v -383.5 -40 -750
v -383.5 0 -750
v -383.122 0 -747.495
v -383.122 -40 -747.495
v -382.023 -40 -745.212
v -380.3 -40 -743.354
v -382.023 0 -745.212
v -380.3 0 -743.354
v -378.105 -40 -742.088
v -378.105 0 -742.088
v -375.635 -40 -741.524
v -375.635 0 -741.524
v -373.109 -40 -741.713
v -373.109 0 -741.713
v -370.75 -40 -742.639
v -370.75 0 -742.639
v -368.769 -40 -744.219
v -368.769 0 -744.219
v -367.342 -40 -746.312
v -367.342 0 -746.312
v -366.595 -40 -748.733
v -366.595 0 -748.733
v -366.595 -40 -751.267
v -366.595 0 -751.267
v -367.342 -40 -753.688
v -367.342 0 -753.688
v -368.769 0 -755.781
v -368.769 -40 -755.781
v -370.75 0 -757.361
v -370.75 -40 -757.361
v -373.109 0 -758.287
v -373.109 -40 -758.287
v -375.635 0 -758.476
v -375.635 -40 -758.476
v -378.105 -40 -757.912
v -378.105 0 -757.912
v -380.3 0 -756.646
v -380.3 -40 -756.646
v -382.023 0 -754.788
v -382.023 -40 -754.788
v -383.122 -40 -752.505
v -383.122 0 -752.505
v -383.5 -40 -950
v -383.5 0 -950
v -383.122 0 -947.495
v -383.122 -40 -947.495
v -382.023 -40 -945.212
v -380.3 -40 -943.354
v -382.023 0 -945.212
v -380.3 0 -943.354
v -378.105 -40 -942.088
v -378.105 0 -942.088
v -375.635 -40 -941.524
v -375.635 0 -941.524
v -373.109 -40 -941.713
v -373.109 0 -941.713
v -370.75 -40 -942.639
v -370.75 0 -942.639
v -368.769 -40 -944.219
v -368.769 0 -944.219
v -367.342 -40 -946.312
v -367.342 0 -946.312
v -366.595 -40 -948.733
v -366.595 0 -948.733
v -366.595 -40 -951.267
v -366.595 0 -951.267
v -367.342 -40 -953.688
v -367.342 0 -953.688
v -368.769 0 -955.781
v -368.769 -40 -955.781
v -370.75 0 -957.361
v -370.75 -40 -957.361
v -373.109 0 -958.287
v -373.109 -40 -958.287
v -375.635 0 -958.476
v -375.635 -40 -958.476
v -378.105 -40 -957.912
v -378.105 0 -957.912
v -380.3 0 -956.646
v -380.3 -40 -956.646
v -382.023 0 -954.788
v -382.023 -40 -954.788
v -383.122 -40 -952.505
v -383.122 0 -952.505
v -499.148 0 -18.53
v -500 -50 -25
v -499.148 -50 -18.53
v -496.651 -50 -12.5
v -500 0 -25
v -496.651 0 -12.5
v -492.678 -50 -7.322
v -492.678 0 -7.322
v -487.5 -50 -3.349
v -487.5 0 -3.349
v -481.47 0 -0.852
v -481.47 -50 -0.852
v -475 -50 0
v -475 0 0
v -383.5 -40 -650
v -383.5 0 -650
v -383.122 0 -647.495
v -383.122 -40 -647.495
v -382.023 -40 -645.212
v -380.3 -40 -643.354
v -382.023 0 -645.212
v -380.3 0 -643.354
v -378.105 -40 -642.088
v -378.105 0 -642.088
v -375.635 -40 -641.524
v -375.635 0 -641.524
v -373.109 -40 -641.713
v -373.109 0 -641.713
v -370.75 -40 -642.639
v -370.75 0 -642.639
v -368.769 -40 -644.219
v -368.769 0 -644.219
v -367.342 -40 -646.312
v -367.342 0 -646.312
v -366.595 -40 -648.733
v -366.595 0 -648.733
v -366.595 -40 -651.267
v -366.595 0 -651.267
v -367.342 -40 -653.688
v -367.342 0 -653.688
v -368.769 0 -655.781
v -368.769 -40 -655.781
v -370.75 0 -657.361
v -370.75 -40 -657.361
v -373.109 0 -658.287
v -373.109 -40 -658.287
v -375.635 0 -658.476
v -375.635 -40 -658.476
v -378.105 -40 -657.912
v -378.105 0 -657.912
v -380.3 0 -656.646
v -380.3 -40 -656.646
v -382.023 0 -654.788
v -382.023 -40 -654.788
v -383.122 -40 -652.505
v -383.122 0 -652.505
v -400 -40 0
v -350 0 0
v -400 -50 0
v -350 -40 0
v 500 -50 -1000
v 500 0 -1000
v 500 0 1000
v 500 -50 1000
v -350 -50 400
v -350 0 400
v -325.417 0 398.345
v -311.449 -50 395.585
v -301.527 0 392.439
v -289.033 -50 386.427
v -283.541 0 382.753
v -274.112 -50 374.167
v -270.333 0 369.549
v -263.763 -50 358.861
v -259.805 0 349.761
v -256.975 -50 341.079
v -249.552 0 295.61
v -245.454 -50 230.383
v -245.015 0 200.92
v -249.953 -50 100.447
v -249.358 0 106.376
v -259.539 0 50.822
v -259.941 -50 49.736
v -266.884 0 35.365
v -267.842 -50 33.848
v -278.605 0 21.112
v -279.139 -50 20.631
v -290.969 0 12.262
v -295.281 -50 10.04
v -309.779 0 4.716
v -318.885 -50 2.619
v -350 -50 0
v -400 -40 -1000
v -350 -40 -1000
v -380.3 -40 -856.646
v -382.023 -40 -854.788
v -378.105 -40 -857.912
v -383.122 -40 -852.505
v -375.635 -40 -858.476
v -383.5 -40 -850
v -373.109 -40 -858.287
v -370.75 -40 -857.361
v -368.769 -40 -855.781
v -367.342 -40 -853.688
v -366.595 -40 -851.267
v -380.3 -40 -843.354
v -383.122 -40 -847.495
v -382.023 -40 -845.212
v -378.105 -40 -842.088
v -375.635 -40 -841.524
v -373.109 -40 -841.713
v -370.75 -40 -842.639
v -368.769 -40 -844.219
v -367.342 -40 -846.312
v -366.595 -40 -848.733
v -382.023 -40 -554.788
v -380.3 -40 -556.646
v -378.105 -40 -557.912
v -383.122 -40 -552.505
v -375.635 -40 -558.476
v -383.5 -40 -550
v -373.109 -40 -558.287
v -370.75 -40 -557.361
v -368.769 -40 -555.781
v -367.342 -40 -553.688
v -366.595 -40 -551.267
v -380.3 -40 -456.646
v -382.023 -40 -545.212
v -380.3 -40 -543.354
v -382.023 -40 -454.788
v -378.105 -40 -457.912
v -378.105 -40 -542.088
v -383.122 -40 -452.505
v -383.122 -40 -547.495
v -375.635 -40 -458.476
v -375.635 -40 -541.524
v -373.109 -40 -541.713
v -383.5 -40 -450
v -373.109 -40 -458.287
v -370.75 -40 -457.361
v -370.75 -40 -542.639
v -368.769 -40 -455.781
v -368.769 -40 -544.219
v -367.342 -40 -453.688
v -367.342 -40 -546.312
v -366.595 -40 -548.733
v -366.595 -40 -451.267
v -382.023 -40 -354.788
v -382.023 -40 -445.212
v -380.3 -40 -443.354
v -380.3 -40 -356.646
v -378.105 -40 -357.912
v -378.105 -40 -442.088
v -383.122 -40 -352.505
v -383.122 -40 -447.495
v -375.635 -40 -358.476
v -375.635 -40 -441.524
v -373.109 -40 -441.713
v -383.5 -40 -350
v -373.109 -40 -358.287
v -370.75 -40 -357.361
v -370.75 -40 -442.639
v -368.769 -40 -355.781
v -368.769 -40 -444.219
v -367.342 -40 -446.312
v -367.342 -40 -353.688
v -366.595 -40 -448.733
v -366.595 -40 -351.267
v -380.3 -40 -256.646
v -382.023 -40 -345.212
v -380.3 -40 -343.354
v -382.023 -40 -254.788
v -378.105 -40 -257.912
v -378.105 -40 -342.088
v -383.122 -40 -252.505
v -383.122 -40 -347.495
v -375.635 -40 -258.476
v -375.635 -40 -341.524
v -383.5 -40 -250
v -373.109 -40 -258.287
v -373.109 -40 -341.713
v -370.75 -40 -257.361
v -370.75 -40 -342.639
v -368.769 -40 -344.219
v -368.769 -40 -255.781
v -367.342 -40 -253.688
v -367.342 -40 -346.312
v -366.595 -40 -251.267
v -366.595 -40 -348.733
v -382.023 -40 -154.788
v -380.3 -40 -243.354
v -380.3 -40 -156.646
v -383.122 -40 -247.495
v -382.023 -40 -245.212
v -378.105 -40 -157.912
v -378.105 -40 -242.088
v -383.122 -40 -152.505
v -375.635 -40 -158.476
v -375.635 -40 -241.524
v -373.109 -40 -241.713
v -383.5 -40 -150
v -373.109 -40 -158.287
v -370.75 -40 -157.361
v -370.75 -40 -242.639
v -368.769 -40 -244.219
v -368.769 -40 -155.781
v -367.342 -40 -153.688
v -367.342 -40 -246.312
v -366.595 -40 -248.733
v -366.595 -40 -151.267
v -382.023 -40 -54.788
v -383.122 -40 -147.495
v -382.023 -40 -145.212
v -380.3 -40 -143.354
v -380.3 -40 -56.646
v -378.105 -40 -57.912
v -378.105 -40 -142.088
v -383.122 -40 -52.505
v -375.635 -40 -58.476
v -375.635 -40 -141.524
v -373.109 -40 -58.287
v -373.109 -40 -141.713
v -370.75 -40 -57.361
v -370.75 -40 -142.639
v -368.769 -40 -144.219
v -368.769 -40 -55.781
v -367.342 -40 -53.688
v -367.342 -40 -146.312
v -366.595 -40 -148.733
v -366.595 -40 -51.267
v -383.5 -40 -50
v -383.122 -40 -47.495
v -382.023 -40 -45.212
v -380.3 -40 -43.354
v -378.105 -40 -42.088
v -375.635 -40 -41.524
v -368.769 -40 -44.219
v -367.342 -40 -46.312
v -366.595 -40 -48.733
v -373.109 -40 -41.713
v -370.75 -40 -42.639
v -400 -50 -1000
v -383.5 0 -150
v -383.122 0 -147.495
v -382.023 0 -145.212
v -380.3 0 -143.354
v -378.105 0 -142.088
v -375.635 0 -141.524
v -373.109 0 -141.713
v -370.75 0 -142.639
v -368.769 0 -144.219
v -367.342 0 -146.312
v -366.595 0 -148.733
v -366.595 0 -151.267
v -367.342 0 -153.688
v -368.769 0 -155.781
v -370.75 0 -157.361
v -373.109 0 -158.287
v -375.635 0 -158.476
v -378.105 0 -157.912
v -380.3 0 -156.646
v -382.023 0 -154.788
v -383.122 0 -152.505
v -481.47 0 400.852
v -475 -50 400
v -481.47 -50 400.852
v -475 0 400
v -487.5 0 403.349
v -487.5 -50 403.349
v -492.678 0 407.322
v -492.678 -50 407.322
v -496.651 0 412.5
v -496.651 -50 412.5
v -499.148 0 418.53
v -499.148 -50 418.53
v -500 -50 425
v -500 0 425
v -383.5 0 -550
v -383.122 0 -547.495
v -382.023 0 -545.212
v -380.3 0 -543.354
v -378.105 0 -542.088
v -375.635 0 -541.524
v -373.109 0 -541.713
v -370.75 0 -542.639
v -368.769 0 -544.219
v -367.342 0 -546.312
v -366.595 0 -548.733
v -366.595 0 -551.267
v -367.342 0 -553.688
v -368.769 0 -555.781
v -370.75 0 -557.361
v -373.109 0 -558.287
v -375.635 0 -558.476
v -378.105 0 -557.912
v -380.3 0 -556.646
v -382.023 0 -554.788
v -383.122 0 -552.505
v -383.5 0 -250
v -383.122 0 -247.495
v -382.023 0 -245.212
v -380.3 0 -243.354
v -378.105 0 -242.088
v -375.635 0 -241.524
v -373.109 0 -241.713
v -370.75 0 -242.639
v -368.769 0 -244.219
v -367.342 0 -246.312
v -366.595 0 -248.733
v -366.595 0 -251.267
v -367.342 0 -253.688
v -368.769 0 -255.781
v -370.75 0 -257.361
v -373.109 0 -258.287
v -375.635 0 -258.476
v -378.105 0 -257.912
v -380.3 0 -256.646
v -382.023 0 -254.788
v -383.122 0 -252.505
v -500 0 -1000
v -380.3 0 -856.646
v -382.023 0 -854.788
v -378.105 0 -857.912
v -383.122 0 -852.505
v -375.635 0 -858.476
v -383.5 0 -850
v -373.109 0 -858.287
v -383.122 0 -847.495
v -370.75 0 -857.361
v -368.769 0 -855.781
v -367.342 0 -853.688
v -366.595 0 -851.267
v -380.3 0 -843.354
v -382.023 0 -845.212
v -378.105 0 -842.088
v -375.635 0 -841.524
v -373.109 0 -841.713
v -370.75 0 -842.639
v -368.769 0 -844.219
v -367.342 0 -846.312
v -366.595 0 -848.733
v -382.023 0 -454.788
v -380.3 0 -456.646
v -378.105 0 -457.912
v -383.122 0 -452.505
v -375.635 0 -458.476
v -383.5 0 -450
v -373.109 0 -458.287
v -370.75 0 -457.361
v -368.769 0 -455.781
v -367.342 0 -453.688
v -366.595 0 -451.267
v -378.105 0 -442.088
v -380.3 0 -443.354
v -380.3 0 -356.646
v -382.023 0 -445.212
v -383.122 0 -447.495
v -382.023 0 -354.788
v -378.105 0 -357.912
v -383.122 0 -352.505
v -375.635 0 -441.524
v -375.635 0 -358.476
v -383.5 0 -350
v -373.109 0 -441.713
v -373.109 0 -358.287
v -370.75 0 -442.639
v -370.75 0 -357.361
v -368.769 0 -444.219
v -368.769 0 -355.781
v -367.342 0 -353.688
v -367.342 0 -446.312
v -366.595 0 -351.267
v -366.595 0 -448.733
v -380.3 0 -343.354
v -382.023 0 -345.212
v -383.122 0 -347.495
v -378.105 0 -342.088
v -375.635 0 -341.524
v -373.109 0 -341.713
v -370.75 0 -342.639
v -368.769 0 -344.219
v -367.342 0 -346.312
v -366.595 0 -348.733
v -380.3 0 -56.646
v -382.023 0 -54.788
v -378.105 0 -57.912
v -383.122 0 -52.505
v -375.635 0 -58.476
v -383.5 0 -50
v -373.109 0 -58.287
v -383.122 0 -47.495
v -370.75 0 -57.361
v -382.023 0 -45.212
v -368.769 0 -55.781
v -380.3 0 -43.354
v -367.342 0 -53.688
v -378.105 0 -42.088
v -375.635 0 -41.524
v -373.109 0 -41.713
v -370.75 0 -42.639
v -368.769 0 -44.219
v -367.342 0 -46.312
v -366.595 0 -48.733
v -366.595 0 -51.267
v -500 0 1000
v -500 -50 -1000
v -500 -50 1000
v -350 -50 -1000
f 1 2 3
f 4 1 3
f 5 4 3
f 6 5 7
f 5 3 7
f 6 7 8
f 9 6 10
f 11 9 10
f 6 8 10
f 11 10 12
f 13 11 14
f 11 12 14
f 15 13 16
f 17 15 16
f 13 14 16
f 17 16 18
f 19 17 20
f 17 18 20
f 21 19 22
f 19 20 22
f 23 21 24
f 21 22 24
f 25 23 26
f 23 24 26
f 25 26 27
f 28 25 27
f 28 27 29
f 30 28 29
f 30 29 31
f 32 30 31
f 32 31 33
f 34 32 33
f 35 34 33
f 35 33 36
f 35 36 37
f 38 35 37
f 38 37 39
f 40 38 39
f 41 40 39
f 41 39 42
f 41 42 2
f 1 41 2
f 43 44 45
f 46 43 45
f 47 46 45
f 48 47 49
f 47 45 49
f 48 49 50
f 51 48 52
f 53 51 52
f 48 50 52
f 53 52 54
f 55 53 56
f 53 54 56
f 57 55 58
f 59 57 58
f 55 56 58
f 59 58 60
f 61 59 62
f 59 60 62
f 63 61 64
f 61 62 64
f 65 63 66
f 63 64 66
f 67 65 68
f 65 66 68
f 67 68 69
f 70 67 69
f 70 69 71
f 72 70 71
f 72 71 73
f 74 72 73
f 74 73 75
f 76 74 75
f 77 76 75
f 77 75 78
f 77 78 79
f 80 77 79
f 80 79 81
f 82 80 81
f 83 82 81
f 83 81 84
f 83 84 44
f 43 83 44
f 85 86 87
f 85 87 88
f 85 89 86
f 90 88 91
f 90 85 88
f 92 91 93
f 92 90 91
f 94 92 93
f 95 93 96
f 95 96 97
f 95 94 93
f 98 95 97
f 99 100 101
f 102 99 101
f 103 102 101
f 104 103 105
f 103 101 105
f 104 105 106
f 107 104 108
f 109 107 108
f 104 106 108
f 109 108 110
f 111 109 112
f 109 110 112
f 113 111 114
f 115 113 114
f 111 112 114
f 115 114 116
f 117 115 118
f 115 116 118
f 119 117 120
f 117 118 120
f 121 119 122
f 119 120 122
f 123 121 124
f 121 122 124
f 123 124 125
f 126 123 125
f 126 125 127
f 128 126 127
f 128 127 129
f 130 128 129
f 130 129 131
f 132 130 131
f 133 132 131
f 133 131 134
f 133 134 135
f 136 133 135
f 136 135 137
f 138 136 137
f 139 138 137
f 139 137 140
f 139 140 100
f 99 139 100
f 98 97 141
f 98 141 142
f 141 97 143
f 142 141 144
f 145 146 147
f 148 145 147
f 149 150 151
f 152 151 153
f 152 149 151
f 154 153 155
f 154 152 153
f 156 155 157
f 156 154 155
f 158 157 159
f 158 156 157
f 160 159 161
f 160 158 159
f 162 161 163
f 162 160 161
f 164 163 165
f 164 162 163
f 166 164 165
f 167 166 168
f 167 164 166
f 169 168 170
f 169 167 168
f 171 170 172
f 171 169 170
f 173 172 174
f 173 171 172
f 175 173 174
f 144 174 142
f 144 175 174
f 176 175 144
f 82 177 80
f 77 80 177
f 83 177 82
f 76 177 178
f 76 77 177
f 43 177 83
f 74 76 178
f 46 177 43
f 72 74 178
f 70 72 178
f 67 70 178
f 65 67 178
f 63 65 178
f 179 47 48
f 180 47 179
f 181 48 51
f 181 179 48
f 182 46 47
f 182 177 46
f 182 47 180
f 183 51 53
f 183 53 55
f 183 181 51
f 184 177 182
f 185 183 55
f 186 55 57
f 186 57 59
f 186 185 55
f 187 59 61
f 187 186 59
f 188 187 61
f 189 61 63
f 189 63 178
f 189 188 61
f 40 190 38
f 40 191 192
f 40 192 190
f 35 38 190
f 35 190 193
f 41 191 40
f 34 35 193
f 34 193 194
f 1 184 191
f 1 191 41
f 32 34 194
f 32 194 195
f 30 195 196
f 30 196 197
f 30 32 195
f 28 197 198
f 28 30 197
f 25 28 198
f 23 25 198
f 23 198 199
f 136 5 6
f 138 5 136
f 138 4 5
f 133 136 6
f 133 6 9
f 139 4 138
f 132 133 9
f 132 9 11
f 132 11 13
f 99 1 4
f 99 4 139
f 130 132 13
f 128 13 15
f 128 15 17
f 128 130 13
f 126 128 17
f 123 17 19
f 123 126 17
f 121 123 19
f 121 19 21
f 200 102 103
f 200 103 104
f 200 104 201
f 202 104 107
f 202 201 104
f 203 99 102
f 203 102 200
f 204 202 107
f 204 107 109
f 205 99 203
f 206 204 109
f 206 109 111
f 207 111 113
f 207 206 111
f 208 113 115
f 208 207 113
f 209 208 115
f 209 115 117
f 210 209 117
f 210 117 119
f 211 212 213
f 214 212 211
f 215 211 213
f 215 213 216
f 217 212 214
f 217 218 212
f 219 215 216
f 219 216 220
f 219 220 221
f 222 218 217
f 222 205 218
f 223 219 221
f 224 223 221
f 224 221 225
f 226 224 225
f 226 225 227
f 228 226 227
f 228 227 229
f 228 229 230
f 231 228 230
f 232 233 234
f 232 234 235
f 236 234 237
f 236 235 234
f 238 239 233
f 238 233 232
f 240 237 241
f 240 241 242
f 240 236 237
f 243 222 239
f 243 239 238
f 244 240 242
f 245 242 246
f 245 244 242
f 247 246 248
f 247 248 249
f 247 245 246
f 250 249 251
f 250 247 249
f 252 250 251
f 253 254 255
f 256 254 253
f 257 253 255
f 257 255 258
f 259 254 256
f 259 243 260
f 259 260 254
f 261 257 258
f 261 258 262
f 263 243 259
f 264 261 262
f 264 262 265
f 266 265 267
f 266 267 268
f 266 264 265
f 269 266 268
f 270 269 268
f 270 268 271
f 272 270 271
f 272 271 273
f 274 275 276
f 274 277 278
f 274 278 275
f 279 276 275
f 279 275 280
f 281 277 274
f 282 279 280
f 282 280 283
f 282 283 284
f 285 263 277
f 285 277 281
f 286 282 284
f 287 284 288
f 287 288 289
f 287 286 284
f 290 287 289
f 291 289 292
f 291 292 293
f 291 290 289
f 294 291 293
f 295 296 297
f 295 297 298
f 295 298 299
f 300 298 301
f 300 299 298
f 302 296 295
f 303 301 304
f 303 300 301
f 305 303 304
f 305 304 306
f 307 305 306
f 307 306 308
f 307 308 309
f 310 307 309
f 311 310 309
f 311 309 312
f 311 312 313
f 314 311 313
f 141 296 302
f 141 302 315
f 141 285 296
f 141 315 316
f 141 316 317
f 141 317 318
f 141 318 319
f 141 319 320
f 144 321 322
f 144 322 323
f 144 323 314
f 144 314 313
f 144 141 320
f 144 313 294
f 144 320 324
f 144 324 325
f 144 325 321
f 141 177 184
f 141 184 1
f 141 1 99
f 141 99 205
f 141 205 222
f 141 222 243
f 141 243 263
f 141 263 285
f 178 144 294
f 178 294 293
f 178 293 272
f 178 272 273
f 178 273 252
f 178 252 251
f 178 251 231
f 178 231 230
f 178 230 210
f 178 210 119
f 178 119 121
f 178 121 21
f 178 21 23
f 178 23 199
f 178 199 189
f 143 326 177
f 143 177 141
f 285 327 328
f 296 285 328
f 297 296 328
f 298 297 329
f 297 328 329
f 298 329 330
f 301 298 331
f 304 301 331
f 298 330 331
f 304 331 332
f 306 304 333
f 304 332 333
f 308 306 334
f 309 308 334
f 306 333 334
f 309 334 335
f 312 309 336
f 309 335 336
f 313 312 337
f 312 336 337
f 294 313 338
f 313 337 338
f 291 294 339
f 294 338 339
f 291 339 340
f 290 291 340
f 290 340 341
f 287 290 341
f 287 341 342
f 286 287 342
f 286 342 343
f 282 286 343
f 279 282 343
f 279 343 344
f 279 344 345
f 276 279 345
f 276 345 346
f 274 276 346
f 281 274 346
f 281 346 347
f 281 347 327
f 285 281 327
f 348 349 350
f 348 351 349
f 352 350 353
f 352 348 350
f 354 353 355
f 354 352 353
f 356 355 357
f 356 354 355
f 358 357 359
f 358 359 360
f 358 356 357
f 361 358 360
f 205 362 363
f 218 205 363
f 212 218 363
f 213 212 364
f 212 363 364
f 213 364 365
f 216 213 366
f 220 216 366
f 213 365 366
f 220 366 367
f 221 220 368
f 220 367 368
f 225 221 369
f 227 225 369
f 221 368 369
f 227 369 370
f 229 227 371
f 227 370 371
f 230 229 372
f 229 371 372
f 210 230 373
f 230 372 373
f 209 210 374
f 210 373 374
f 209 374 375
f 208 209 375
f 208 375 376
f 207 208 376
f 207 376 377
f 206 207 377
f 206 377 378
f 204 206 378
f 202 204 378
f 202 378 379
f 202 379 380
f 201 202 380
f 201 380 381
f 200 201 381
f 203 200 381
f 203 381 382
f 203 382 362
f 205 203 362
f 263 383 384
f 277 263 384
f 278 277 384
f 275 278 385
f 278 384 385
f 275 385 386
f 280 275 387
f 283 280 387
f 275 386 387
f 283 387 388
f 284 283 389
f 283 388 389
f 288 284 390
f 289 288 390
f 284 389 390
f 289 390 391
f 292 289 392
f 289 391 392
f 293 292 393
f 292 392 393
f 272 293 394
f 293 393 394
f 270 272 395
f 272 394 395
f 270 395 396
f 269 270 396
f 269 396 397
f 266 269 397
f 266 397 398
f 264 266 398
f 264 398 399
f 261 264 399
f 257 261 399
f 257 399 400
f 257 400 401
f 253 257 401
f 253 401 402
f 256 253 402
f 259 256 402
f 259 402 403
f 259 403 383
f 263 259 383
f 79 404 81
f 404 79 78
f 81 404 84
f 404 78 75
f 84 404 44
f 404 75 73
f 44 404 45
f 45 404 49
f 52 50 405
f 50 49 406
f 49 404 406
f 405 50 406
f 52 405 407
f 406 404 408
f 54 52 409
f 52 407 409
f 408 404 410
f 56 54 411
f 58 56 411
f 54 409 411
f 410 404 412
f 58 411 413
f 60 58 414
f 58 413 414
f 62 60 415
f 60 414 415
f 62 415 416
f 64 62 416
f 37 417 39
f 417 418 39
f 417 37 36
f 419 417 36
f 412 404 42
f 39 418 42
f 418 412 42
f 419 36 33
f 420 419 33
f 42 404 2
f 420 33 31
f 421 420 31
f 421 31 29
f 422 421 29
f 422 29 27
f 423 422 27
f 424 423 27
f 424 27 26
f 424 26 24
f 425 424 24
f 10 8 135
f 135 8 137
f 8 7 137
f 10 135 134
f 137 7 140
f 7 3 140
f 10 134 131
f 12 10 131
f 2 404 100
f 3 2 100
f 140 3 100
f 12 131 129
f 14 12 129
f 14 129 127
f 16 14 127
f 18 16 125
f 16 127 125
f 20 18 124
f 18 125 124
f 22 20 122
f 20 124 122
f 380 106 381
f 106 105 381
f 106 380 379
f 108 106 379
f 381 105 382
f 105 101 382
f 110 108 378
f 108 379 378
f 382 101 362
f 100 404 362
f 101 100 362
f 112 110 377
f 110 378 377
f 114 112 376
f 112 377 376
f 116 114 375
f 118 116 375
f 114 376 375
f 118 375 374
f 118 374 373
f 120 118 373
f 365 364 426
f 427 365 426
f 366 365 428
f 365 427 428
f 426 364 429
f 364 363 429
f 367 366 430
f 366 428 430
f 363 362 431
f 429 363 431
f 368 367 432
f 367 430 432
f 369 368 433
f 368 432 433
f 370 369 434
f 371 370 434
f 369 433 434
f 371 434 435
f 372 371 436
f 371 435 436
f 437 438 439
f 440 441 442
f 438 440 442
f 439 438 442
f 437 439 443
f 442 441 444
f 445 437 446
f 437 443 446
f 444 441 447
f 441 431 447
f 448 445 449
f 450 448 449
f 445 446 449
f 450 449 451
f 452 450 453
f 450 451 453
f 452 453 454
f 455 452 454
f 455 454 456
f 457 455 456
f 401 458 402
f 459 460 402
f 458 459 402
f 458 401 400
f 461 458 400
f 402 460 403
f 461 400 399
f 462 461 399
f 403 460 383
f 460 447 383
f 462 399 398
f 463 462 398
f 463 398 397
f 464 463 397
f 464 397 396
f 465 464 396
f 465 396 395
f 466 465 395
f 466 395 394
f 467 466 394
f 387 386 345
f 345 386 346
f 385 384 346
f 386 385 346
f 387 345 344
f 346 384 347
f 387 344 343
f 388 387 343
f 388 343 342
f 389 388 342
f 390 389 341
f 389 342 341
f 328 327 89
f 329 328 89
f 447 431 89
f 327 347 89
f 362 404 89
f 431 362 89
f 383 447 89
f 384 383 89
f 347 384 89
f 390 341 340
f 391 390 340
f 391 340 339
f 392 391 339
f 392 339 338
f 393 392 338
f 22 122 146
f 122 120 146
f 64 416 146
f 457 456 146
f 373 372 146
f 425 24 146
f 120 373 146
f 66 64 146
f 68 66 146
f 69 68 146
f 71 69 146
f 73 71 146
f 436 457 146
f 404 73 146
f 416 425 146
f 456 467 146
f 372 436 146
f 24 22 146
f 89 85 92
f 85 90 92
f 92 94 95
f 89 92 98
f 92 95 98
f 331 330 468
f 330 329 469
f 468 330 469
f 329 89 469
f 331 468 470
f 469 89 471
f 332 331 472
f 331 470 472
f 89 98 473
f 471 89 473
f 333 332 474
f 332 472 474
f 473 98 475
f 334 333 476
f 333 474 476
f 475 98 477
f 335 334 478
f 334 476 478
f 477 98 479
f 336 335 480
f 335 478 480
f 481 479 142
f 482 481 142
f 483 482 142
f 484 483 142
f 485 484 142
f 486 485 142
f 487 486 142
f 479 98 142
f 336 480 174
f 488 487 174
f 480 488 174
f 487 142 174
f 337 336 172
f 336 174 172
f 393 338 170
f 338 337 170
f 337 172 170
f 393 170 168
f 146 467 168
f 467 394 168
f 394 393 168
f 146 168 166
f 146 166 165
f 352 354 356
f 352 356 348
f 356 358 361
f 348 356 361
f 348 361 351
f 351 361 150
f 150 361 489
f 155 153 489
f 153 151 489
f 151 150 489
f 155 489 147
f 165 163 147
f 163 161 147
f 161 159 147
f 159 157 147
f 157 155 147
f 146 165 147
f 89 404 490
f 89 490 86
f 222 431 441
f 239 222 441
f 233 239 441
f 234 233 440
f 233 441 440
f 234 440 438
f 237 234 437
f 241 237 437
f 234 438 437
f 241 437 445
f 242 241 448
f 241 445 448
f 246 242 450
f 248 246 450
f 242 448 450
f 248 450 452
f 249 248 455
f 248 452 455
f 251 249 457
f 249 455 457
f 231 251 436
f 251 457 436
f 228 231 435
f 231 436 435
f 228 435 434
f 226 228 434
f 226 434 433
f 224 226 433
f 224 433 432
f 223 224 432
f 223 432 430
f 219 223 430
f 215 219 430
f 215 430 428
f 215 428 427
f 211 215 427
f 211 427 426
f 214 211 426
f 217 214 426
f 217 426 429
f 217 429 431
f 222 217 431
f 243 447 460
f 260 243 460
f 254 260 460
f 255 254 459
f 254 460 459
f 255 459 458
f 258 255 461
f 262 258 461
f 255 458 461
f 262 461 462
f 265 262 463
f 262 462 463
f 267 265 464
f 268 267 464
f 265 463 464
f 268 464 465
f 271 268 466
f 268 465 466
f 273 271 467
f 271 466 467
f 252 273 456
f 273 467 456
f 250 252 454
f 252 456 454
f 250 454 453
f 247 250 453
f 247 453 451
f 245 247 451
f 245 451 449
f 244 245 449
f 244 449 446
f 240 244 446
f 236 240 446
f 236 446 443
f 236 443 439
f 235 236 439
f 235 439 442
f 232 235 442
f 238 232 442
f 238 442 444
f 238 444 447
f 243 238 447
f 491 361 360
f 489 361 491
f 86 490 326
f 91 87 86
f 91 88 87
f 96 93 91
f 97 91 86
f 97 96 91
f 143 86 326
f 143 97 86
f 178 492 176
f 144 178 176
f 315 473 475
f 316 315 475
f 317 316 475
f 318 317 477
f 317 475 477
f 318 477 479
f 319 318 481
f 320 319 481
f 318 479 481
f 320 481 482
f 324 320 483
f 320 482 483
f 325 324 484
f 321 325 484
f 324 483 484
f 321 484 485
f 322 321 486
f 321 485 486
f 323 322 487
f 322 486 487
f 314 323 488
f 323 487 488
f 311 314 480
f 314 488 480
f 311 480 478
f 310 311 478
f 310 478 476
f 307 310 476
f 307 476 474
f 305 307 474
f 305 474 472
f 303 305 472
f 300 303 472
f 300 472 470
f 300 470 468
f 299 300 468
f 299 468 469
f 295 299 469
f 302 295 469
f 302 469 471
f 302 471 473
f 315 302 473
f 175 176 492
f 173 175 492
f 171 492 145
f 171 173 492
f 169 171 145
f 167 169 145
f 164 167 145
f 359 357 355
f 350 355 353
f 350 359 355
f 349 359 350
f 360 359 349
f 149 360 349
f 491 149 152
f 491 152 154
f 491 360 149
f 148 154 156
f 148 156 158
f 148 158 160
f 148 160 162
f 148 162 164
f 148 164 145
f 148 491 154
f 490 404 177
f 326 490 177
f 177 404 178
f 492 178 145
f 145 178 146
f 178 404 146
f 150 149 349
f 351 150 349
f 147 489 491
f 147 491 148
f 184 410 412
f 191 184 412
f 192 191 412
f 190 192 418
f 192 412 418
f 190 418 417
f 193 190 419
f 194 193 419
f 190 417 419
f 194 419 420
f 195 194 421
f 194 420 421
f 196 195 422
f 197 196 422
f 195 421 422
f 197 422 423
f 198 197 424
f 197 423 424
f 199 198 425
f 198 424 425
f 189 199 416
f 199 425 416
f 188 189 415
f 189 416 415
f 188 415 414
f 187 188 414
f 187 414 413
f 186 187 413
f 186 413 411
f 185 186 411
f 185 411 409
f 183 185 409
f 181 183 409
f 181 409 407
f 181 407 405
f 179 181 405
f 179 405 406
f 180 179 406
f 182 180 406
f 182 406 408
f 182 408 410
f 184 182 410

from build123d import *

# Parameters (mm, degrees)
F0_W     = 1000
F0_H     = 2000
F1_DEPTH = 50
F2_W     = 50
F2_H     = 1000
F3_DEPTH = 10
F5_DEPTH = 50.001
F6_R     = 25
F8_D     = 17


with BuildPart() as f1:
    # F0 (on Front) → F1 (new body)
    with BuildSketch(Plane.XZ):
        Rectangle(F0_W, F0_H)
    extrude(amount=F1_DEPTH)

    # F2 (on face) → F3 (cut)
    with BuildSketch(Plane.XZ.offset(50)):
        with Locations((-375, -500)):
            Rectangle(F2_W, F2_H)
    extrude(amount=-F3_DEPTH, mode=Mode.SUBTRACT)

    # F4 (on face) → F5 (cut, through all)
    with BuildSketch(Plane.XZ.offset(50)):
        with BuildLine():
            Line((-500, 400), (-500, 0))
            Line((-500, 0), (-400, 0))
            Line((-400, 0), (-350, 0))
            add(Edge.make_bspline(
                [(-350, 400), (-265.8781409264, 399.6310830116), (-243.3533661906, 298.146550271), (-243.3533661906, 102.0078794031), (-265.8781409264, 0), (-350, 0)],
                knots=[0, 0, 0, 0, 0.3135575596, 0.6864424404, 1, 1, 1, 1], degree=3))
            Line((-350, 400), (-500, 400))
        make_face()
    extrude(amount=-F5_DEPTH, mode=Mode.SUBTRACT)

    # F6
    f6_edges = [f1.edges().sort_by_distance(p)[0] for p in [
        (-500, -25, 400),
        (-500, -25, 0),
    ]]
    fillet(f6_edges, radius=F6_R)

    # F8 (through all)
    with Locations(Plane.XZ.offset(40)):
        with Locations((-375, -50), (-375, -150), (-375, -250), (-375, -350), (-375, -450), (-375, -550), (-375, -650), (-375, -750), (-375, -850), (-375, -950)):
            Hole(F8_D / 2)


solid = f1.part
